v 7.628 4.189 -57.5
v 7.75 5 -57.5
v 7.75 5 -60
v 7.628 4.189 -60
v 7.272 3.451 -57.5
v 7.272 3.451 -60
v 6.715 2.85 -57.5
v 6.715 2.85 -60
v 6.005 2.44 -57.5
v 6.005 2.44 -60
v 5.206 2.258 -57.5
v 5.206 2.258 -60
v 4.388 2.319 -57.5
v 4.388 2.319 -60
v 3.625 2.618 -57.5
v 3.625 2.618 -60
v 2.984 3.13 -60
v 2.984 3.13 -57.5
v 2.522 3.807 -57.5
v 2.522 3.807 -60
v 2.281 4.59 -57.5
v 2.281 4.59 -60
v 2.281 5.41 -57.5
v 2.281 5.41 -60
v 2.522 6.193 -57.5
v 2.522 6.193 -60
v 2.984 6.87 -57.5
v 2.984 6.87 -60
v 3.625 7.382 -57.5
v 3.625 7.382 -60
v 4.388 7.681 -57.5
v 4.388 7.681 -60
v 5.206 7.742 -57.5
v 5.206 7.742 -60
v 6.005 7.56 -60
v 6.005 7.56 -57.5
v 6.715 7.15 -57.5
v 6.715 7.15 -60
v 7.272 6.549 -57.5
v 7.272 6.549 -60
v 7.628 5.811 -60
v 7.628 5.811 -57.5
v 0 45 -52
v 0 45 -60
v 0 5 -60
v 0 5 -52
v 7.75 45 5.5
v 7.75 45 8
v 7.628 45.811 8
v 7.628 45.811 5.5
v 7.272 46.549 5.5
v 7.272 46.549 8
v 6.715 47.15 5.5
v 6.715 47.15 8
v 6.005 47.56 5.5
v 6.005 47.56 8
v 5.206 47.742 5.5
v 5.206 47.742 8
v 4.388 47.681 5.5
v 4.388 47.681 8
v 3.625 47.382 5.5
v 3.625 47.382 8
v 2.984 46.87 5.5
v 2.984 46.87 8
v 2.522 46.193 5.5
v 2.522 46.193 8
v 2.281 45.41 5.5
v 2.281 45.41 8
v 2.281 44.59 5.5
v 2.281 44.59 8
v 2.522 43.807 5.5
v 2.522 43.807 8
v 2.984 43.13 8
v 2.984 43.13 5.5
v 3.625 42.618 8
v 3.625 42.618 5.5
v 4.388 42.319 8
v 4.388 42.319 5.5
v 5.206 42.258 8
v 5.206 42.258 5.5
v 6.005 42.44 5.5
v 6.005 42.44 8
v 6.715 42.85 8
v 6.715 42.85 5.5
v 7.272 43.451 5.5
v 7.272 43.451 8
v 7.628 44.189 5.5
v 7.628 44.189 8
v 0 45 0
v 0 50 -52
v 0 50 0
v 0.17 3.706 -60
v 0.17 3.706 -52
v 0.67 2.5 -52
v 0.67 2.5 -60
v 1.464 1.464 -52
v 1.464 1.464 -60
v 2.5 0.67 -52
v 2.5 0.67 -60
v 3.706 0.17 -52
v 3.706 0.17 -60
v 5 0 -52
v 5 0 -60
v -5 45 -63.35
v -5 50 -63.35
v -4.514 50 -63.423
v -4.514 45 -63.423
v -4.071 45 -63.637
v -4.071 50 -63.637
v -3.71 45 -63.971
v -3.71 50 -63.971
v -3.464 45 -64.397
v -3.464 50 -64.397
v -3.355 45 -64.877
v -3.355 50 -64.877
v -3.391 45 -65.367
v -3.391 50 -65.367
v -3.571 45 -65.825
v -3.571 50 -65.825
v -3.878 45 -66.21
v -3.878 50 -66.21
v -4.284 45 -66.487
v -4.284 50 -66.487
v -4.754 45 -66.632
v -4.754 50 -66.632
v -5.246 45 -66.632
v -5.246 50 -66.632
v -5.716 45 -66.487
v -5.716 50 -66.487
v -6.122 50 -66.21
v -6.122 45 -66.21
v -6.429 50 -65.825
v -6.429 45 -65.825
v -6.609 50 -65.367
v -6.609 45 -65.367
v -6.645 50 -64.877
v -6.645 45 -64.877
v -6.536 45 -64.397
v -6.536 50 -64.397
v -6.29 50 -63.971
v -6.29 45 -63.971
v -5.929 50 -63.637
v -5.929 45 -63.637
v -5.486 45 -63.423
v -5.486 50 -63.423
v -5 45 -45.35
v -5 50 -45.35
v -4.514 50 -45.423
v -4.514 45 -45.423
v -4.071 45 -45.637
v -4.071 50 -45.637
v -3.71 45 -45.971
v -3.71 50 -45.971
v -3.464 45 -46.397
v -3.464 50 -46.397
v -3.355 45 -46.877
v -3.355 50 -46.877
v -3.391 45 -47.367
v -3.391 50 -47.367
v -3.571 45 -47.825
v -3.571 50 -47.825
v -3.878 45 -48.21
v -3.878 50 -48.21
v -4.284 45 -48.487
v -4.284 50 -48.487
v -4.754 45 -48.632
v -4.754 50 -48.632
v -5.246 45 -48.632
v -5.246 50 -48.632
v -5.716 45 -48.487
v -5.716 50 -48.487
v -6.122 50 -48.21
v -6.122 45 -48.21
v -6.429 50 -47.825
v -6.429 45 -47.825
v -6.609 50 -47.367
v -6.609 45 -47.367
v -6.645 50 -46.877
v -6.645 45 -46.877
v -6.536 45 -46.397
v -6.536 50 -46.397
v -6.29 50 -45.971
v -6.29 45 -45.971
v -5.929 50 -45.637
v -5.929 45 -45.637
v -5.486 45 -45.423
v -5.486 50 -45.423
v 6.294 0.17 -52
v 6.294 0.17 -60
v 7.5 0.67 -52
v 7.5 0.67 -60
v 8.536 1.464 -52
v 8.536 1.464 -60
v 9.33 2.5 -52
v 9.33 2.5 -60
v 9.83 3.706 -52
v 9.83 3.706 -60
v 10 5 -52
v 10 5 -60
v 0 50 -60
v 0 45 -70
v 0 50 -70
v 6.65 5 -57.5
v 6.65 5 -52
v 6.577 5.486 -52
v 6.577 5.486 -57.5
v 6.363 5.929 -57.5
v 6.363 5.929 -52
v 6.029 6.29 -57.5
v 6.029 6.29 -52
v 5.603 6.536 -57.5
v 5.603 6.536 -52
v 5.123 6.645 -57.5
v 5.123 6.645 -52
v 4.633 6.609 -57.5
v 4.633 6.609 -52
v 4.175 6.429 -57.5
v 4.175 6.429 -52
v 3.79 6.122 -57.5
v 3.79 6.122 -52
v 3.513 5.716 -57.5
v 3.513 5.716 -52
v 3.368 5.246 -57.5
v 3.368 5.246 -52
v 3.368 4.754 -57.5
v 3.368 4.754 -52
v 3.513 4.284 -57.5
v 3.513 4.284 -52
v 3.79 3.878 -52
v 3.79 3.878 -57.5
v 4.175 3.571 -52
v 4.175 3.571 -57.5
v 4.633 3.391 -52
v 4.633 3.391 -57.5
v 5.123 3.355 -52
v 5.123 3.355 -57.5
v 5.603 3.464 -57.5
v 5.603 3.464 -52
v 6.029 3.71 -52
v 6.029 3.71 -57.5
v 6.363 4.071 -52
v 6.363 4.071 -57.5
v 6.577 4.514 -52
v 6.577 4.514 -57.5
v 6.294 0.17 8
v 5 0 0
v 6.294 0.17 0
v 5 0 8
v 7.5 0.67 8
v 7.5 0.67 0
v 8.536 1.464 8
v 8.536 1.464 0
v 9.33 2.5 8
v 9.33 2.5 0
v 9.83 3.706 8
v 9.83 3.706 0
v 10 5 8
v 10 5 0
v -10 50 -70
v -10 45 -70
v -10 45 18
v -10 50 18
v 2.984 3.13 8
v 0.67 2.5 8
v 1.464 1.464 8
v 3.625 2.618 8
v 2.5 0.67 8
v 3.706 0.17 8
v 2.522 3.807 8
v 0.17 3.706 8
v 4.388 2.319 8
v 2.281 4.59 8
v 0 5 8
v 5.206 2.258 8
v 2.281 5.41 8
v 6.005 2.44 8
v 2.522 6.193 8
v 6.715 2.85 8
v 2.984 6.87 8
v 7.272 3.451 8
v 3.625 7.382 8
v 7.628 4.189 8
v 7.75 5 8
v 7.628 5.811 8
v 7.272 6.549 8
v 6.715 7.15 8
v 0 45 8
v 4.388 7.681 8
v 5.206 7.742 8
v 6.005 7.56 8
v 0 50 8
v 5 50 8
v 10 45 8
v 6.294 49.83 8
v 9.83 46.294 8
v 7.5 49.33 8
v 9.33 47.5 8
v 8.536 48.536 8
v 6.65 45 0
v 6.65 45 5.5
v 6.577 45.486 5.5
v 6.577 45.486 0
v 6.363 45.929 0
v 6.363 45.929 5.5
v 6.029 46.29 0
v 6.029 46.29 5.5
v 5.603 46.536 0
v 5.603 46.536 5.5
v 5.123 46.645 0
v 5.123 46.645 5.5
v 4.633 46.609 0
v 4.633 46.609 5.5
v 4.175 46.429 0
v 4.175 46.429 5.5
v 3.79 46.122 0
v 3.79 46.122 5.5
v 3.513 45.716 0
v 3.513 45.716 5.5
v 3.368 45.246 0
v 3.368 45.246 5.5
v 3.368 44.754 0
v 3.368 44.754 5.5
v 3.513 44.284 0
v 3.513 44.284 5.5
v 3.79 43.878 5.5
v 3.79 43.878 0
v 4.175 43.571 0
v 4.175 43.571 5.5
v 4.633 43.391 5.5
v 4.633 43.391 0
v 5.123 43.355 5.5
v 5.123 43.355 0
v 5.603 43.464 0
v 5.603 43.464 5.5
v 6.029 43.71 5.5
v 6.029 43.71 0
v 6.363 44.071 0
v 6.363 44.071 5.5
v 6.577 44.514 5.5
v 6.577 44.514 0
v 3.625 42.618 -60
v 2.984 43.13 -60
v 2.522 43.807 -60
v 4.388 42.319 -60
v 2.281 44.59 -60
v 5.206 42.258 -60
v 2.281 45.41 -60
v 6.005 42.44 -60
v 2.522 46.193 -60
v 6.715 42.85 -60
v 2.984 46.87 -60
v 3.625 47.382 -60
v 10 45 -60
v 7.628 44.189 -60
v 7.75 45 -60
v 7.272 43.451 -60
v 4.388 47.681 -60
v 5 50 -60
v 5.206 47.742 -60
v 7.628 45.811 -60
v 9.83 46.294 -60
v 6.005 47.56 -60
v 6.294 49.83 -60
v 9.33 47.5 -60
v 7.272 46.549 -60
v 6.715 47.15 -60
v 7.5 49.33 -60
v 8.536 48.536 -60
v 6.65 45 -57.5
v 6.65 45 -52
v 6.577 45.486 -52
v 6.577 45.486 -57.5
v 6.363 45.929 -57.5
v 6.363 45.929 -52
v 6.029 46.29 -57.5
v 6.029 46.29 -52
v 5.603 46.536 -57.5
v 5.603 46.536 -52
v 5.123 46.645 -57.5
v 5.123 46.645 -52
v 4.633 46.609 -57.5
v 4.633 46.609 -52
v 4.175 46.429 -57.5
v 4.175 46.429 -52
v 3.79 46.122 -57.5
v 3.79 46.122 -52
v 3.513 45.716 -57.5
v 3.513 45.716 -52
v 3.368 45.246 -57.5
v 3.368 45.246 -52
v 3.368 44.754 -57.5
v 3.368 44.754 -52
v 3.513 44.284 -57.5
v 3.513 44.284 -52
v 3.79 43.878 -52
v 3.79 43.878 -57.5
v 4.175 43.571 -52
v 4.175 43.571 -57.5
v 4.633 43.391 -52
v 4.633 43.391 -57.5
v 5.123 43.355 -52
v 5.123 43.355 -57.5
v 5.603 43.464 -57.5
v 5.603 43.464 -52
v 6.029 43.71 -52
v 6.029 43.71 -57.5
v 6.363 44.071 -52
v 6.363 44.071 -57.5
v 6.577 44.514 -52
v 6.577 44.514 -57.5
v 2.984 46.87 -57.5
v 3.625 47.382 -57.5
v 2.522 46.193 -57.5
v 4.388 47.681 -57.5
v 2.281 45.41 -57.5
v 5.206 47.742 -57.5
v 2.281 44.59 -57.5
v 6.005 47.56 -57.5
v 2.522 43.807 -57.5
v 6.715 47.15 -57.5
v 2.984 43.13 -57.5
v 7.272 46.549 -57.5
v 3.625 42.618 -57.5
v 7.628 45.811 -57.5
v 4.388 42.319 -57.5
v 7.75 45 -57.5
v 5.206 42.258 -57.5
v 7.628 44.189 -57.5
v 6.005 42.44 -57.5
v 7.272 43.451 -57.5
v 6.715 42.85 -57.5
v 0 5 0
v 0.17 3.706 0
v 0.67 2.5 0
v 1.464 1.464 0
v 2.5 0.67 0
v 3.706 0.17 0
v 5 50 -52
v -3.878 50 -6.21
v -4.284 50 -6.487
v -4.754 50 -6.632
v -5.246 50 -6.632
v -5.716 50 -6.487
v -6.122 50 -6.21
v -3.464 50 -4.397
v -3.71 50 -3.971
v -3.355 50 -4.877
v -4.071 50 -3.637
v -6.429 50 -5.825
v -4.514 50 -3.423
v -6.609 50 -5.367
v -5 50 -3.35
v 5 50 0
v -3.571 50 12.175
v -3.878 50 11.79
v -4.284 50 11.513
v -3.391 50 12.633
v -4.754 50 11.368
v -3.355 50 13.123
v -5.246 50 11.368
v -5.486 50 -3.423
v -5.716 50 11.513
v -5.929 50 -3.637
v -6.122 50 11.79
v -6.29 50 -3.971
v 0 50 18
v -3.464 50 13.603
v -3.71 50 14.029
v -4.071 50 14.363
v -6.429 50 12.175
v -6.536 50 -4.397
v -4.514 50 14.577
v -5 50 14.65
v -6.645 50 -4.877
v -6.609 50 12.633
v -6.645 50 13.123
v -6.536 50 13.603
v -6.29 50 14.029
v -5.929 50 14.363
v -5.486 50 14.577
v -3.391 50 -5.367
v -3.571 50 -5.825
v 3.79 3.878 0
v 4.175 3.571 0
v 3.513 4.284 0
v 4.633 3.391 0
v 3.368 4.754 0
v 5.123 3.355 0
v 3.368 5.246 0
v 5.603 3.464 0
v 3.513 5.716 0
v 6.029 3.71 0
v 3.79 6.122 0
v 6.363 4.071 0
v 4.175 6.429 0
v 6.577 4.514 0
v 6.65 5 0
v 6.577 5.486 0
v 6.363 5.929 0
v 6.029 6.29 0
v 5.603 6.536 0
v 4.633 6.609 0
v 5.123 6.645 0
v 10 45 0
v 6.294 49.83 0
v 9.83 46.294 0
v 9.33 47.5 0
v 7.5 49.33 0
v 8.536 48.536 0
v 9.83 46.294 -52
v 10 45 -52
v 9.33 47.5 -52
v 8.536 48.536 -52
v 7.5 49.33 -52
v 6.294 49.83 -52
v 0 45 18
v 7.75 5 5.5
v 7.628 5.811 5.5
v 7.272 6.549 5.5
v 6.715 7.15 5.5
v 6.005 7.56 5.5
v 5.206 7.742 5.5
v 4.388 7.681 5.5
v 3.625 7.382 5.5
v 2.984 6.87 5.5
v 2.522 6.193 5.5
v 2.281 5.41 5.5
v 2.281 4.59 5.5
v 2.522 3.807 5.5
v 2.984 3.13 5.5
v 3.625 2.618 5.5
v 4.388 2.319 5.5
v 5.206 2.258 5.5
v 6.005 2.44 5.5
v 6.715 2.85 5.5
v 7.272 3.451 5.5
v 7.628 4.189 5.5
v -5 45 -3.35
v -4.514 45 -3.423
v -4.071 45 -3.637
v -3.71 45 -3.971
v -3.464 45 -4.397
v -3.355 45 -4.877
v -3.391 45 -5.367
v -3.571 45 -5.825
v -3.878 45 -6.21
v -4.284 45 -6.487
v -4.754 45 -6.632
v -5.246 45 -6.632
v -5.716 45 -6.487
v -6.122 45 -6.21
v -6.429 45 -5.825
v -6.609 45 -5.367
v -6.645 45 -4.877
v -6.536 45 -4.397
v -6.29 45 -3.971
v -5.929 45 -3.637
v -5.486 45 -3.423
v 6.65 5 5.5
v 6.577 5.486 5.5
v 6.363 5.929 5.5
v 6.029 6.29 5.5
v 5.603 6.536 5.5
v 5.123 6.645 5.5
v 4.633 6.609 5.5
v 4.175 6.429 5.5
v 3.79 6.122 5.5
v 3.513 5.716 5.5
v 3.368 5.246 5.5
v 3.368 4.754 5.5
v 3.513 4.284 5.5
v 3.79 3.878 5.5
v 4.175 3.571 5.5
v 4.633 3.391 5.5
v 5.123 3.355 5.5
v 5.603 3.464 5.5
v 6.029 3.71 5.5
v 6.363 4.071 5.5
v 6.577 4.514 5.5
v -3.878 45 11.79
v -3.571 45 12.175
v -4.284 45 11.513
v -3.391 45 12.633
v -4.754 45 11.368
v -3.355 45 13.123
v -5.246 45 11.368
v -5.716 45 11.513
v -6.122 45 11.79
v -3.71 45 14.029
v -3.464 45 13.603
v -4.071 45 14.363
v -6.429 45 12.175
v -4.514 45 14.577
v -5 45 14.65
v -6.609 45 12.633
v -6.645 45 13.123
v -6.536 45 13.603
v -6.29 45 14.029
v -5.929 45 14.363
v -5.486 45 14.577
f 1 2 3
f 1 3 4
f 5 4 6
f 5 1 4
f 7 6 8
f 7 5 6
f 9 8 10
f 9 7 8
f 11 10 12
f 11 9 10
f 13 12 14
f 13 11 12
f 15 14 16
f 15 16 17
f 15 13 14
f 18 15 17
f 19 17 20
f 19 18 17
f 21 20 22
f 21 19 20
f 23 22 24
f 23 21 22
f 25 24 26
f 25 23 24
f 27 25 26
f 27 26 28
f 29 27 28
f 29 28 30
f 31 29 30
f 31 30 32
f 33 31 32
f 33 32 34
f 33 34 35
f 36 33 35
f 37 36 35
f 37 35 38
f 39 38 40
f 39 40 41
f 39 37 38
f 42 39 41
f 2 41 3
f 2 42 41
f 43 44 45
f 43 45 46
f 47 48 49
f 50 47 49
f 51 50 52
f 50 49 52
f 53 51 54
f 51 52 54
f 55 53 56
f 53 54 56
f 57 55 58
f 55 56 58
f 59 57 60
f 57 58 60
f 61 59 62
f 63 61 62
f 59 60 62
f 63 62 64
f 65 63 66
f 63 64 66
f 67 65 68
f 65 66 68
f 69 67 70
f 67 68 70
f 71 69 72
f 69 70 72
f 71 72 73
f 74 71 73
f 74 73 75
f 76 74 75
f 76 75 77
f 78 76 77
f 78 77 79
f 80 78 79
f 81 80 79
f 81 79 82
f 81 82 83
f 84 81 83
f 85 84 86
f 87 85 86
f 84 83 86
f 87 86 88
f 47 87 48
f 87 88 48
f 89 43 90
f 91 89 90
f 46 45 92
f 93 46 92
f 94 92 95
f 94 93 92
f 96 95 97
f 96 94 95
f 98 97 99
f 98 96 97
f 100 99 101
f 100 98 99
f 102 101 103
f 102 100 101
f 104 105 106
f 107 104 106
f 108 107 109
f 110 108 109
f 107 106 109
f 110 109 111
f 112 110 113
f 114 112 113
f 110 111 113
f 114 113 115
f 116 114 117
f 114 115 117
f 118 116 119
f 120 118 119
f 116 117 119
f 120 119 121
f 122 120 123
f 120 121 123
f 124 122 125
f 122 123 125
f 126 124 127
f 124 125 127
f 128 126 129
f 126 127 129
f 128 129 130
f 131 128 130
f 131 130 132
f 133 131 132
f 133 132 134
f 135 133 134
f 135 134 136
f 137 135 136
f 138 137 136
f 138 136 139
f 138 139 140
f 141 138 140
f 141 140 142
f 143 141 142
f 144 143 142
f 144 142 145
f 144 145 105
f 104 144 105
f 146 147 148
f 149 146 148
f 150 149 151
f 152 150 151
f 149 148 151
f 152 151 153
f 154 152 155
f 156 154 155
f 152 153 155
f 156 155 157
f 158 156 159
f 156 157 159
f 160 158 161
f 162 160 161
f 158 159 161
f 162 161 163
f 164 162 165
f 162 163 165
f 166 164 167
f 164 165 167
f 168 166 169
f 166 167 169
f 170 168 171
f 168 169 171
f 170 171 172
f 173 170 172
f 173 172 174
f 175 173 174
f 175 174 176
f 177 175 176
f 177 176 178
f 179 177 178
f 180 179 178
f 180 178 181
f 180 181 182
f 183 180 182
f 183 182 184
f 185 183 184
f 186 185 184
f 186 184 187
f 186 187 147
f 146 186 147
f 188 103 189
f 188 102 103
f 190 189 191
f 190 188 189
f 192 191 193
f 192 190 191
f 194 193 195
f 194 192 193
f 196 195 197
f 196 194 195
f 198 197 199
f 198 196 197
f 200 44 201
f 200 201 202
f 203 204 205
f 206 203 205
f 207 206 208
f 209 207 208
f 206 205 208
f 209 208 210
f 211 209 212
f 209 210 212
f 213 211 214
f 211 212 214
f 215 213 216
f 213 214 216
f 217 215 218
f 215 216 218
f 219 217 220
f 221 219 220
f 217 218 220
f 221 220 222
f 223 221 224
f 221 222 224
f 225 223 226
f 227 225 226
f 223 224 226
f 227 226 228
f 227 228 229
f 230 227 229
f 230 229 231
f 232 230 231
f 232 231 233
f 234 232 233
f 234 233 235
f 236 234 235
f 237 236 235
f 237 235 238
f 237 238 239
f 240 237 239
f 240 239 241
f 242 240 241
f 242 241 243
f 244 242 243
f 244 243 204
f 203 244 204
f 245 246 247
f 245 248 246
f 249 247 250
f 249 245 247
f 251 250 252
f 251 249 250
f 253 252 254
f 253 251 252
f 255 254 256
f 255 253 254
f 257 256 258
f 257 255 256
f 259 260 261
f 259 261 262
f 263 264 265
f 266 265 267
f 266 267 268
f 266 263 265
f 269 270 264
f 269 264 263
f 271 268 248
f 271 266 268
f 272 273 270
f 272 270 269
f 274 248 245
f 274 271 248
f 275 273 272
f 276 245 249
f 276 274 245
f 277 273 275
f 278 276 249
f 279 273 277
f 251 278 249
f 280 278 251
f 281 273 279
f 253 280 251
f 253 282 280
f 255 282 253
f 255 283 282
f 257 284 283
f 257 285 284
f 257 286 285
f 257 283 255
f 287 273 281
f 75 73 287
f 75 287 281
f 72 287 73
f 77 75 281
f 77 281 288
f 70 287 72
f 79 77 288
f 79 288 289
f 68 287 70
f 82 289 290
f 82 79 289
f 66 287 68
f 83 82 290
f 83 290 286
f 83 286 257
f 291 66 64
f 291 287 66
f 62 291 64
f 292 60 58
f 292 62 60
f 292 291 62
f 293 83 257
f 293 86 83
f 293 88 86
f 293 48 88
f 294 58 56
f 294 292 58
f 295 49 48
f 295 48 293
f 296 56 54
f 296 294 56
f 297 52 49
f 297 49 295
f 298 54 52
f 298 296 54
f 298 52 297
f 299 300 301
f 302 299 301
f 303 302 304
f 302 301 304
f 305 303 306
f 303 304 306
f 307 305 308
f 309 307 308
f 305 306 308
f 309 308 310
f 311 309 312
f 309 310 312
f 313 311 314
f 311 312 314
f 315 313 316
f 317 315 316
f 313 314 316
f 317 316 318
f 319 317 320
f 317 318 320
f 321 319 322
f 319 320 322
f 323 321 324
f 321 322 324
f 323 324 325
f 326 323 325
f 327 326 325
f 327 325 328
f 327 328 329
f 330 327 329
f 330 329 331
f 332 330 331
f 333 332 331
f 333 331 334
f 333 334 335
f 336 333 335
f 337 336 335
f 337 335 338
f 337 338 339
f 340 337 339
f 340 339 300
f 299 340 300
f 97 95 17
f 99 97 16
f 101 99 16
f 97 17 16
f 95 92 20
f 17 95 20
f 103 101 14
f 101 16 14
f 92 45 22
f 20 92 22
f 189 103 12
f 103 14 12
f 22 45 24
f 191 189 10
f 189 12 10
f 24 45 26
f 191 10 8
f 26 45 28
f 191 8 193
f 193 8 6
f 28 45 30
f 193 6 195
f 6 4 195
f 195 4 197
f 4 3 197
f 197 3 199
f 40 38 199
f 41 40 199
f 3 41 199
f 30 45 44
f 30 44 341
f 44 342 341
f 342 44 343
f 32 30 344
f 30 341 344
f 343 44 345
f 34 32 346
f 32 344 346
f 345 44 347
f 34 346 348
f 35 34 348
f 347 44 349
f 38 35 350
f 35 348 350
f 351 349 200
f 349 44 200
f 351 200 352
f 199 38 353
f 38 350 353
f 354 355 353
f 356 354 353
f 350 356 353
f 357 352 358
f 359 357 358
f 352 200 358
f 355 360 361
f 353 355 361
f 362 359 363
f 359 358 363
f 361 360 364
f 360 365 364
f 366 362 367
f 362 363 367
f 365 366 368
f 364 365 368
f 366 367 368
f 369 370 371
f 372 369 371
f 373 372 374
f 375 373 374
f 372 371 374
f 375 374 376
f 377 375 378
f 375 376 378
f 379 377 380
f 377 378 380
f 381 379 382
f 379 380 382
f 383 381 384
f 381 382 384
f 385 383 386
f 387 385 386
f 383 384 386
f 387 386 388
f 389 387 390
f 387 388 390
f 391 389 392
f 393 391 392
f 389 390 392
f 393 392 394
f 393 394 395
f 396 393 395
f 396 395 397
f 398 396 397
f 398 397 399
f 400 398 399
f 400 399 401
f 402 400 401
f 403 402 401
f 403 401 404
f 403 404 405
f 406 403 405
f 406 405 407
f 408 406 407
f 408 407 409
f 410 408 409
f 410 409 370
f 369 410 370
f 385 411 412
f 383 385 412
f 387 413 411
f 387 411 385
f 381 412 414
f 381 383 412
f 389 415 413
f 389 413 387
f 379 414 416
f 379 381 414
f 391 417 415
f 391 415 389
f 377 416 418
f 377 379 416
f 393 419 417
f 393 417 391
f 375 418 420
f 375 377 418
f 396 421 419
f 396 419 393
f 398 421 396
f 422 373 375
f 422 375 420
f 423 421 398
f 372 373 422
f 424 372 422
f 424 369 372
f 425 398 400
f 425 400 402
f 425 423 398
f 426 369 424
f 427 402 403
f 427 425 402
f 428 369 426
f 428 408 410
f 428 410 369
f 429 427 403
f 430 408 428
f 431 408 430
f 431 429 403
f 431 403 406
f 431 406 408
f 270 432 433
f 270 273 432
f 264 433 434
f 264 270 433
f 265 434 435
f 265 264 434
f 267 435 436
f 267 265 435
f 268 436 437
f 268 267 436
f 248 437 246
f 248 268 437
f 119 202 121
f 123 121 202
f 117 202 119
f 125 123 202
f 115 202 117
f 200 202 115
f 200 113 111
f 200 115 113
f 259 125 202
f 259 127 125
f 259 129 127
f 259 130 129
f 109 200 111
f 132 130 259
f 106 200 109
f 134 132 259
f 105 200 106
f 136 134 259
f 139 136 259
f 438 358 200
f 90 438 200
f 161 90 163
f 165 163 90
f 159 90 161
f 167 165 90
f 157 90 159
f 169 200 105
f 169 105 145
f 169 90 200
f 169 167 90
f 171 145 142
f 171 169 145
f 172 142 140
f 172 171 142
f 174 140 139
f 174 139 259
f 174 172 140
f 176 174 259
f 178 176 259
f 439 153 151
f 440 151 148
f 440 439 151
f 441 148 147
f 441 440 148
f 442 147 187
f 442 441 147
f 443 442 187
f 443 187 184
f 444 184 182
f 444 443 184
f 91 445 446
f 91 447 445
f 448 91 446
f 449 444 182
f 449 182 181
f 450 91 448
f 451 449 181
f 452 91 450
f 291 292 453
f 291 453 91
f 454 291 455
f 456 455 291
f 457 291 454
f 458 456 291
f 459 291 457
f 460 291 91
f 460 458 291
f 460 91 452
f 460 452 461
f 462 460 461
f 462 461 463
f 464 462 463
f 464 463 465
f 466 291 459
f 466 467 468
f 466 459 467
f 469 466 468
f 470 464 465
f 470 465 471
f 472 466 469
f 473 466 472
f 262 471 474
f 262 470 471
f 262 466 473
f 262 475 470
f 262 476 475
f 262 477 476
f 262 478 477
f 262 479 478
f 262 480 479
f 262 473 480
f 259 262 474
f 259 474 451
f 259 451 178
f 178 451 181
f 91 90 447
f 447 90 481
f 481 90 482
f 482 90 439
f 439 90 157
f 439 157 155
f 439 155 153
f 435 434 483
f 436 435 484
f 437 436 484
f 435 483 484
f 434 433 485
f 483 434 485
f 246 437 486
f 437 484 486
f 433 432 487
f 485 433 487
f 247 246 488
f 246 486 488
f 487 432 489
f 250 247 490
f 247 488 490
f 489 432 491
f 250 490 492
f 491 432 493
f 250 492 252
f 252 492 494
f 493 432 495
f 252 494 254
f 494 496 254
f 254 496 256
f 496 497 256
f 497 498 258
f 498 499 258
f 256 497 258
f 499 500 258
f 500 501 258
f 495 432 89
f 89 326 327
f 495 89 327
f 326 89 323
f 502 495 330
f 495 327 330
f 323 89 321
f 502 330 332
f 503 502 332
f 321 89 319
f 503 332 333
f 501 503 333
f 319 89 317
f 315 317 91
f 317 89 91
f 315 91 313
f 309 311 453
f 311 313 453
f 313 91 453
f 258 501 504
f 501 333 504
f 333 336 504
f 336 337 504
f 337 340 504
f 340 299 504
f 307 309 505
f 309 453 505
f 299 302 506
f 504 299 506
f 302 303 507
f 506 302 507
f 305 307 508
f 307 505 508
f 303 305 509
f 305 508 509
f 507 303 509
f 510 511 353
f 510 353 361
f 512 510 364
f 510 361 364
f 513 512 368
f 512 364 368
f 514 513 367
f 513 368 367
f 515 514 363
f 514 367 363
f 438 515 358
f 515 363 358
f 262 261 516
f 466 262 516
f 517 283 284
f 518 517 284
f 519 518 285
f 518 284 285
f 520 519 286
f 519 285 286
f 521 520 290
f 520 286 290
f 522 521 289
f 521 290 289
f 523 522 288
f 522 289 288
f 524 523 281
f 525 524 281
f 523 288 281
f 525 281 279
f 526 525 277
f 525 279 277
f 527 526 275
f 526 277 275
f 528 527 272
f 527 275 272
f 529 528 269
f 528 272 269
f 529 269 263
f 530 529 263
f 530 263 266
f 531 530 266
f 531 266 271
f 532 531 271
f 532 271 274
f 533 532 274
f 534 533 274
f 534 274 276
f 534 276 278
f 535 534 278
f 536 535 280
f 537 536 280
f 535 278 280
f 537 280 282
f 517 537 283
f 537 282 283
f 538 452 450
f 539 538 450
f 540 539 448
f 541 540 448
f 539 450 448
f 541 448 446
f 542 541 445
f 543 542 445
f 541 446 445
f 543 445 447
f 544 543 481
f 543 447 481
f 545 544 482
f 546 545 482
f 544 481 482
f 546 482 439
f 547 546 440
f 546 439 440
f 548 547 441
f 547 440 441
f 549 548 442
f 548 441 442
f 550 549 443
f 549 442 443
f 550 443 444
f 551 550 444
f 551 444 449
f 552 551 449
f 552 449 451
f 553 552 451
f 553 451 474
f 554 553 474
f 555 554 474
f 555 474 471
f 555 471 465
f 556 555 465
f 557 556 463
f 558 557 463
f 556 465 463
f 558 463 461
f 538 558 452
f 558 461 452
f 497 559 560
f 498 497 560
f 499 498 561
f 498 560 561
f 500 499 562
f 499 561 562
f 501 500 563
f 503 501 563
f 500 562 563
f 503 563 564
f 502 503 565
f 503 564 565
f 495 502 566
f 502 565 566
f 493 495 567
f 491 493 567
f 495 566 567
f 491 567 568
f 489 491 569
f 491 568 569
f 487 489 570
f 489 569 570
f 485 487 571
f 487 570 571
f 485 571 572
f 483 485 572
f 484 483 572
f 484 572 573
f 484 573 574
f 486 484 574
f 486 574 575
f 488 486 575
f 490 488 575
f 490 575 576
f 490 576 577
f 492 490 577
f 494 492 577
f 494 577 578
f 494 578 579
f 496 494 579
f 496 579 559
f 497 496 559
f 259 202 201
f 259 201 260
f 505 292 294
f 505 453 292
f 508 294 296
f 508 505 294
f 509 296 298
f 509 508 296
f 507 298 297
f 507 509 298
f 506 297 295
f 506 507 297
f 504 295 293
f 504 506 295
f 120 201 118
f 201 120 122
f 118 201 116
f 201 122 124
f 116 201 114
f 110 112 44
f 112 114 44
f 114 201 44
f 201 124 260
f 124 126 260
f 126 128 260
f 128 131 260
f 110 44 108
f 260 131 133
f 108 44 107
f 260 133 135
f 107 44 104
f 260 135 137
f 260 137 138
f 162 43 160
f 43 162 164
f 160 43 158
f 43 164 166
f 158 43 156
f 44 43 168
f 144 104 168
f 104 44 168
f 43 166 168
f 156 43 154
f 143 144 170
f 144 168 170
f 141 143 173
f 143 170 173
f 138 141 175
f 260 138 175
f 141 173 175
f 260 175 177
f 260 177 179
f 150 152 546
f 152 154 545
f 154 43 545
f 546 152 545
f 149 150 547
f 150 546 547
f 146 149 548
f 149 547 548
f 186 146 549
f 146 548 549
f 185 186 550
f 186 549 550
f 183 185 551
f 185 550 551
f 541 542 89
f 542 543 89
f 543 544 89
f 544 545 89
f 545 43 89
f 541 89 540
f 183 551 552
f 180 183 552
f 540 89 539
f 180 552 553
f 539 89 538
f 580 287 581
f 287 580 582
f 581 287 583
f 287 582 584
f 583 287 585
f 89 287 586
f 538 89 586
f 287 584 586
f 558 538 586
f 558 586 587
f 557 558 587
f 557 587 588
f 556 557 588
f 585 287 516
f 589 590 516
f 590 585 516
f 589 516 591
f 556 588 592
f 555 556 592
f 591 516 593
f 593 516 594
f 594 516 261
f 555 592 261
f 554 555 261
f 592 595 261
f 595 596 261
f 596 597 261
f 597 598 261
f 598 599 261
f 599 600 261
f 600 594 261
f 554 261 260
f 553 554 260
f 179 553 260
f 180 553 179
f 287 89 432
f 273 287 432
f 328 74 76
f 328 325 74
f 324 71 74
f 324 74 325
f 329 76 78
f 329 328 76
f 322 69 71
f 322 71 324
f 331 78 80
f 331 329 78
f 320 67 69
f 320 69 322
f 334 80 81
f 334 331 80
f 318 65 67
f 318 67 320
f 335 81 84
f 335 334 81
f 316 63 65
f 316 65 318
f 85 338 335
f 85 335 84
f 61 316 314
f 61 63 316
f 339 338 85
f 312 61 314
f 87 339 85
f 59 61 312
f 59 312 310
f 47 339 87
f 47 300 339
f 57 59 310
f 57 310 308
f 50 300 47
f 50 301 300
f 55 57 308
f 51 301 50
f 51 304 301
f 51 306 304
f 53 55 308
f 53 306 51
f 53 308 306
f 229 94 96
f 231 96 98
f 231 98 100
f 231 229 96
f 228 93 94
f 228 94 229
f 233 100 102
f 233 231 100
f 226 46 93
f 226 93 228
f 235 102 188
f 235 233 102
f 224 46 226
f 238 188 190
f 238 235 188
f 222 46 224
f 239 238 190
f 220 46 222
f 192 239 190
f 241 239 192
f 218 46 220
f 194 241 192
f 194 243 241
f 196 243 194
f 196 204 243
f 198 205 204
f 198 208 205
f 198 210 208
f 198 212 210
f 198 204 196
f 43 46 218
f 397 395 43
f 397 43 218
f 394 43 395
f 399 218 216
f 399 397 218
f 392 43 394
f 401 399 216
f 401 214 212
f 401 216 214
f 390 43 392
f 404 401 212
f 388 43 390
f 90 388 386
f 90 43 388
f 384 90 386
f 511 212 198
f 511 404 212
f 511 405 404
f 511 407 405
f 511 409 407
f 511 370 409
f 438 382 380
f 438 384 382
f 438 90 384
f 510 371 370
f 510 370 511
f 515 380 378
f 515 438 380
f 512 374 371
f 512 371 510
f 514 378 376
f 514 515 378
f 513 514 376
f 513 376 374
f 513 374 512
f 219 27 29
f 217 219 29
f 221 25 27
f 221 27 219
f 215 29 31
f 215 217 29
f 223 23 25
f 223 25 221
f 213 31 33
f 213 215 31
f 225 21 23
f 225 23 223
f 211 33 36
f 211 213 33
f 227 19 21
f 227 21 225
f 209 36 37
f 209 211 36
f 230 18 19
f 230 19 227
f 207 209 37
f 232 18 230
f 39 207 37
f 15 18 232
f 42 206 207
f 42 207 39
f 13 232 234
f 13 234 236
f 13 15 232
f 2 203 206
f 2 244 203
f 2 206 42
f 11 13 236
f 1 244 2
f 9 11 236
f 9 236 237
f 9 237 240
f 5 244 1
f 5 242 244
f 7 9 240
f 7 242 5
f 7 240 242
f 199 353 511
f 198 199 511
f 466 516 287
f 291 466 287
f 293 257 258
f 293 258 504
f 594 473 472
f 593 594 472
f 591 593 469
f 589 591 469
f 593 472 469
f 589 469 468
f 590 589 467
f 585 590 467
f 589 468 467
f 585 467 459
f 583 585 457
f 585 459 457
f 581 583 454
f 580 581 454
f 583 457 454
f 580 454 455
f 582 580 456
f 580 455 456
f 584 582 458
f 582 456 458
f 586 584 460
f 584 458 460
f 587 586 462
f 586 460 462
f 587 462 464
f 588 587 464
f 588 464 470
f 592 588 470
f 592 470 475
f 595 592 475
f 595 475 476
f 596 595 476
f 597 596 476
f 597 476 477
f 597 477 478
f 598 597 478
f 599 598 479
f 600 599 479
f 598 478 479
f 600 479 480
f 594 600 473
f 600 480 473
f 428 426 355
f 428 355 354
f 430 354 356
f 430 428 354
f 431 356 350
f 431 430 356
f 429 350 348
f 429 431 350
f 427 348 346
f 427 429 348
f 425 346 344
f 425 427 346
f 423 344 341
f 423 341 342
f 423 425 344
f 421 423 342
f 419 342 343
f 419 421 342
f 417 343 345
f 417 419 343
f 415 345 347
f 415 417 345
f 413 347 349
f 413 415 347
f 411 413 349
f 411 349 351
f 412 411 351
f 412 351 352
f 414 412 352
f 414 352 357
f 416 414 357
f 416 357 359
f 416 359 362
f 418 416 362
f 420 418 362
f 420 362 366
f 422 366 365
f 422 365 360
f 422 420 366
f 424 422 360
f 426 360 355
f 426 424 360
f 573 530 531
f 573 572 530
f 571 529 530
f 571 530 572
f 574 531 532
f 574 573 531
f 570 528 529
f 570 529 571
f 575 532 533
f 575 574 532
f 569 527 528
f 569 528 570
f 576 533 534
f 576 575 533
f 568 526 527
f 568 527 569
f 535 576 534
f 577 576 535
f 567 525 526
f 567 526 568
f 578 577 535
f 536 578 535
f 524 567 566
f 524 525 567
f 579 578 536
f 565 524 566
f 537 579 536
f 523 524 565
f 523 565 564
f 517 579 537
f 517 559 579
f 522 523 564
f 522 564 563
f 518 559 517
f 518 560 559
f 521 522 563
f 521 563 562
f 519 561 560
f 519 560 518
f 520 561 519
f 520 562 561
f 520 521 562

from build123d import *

# Parameters (mm, degrees)
P_IDAT_VYSUNUT_M1_DEPTH  = 8
SKICA2_R                 = 1.65
ODEBRAT_VYSUNUT_M1_DEPTH = 47.786750261
P_IDAT_VYSUNUT_M2_DEPTH  = 5
SKICA4_R                 = 1.65
ODEBRAT_VYSUNUT_M2_DEPTH = 5
SKICA5_R                 = 1.65
ODEBRAT_VYSUNUT_M3_DEPTH = 55.074023338
ZAOBLIT1_R               = 5
SKICA6_W                 = 2
SKICA6_H                 = 23
P_IDAT_VYSUNUT_M3_DEPTH  = 8
SKICA7_R                 = 2.75
ODEBRAT_VYSUNUT_M4_DEPTH = 2.5
SKICA8_W                 = 10
SKICA8_H                 = 5
P_IDAT_VYSUNUT_M4_DEPTH  = 60
SKICA9_W                 = 8
SKICA9_H                 = 5
P_IDAT_VYSUNUT_M5_DEPTH  = 10
SKICA10_W                = 10
SKICA10_H                = 8
P_IDAT_VYSUNUT_M6_DEPTH  = 45
ZAOBLIT2_R               = 5
SKICA11_R                = 1.65
ODEBRAT_VYSUNUT_M5_DEPTH = 45
ODEBRAT_START            = -2.5
SKICA12_R                = 2.75
ODEBRAT_VYSUNUT_M6_DEPTH = 2.5
SKICA13_R                = 1.65
ODEBRAT_VYSUNUT_M7_DEPTH = 12.5


with BuildPart() as part:
    # Skica1 → Přidat vysunutím1 (new body)
    with BuildSketch(Plane.XY):
        Polygon((0, 0), (10, 0), (10, 10), (8, 10), (8, 33), (10, 33), (10, 45), (0, 45), align=None)
    extrude(amount=P_IDAT_VYSUNUT_M1_DEPTH)

    # Skica2 → Odebrat vysunutím1 (cut, through all)
    with BuildSketch(Plane.XY.offset(8)):
        with Locations((5, 45)):
            Circle(SKICA2_R)
        with Locations((5, 5)):
            Circle(SKICA2_R)
    extrude(amount=-ODEBRAT_VYSUNUT_M1_DEPTH, mode=Mode.SUBTRACT)

    # Skica3 → Přidat vysunutím2 (add)
    with BuildSketch(Plane(origin=(0, 45, 0), x_dir=(1, 0, 0), z_dir=(0, 1, 0))):
        Polygon((0, 0), (0, 10), (-10, 10), (-10, -18), (0, -18), (0, -8), (10, -8), (10, 0), align=None)
    extrude(amount=P_IDAT_VYSUNUT_M2_DEPTH)

    # Skica4 → Odebrat vysunutím2 (cut)
    with BuildSketch(Plane(origin=(0, 50, 0), x_dir=(1, 0, 0), z_dir=(0, 1, 0))):
        with Locations(Location((-5, 5, 0), (0, 0, 270))):
            Circle(SKICA4_R)
        with Locations(Location((-5, -13, 0), (0, 0, 270))):
            Circle(SKICA4_R)
    extrude(amount=-ODEBRAT_VYSUNUT_M2_DEPTH, mode=Mode.SUBTRACT)

    # Skica5 → Odebrat vysunutím3 (cut, through all)
    with BuildSketch(Plane.XY.offset(8)):
        with Locations((5, 45)):
            Circle(SKICA5_R)
    extrude(amount=-ODEBRAT_VYSUNUT_M3_DEPTH, mode=Mode.SUBTRACT)

    # Zaoblit1
    zaoblit1_edges = [part.edges().sort_by_distance(p)[0] for p in [
        (0, 0, 4),
        (10, 0, 4),
        (10, 50, 4),
    ]]
    fillet(zaoblit1_edges, radius=ZAOBLIT1_R - 0.0001)  # a hair under: the kernel refuses the full size

    # Skica6 → Přidat vysunutím3 (add)
    with BuildSketch(Plane.XY.offset(8)):
        with Locations((9, 21.5)):
            Rectangle(SKICA6_W, SKICA6_H)
    extrude(amount=-P_IDAT_VYSUNUT_M3_DEPTH)

    # Skica7 → Odebrat vysunutím4 (cut)
    with BuildSketch(Plane.XY.offset(8)):
        with Locations((5, 5)):
            Circle(SKICA7_R)
        with Locations((5, 45)):
            Circle(SKICA7_R)
    extrude(amount=-ODEBRAT_VYSUNUT_M4_DEPTH, mode=Mode.SUBTRACT)

    # Skica8 → Přidat vysunutím4 (add)
    with BuildSketch(Plane(origin=(0, 0, -10), x_dir=(-1, 0, 0), z_dir=(0, 0, -1))):
        with Locations((5, 47.5)):
            Rectangle(SKICA8_W, SKICA8_H)
    extrude(amount=P_IDAT_VYSUNUT_M4_DEPTH)

    # Skica9 → Přidat vysunutím5 (add)
    with BuildSketch(Plane(origin=(0, 0, 0), x_dir=(0, 0, -1), z_dir=(1, 0, 0))):
        with Locations((56, 47.5)):
            Rectangle(SKICA9_W, SKICA9_H)
    extrude(amount=P_IDAT_VYSUNUT_M5_DEPTH)

    # Skica10 → Přidat vysunutím6 (add)
    with BuildSketch(Plane.XZ.offset(-45)):
        with Locations((5, -56)):
            Rectangle(SKICA10_W, SKICA10_H)
    extrude(amount=P_IDAT_VYSUNUT_M6_DEPTH)

    # Zaoblit2
    zaoblit2_edges = [part.edges().sort_by_distance(p)[0] for p in [
        (10, 50, -56),
        (10, 0, -56),
        (0, 0, -56),
    ]]
    fillet(zaoblit2_edges, radius=ZAOBLIT2_R - 0.0001)  # a hair under: the kernel refuses the full size

    # Skica11 → Odebrat vysunutím5 (cut)
    with BuildSketch(Plane.XY.offset(-52)):
        with Locations((5, 45)):
            Circle(SKICA11_R)
        with Locations((5, 5)):
            Circle(SKICA11_R)
    extrude(amount=-ODEBRAT_VYSUNUT_M5_DEPTH, mode=Mode.SUBTRACT)

    # Skica12 → Odebrat vysunutím6 (cut)
    with BuildSketch(Plane(origin=(0, 0, -60), x_dir=(-1, 0, 0), z_dir=(0, 0, -1)).offset(ODEBRAT_START)):
        with Locations(Location((-5, 45, 0), (0, 0, 180))):
            Circle(SKICA12_R)
        with Locations(Location((-5, 5, 0), (0, 0, 180))):
            Circle(SKICA12_R)
    extrude(amount=ODEBRAT_VYSUNUT_M6_DEPTH, mode=Mode.SUBTRACT)

    # Skica13 → Odebrat vysunutím7 (cut)
    with BuildSketch(Plane(origin=(0, 50, 0), x_dir=(1, 0, 0), z_dir=(0, 1, 0))):
        with Locations(Location((-5, 65, 0), (0, 0, 270))):
            Circle(SKICA13_R)
        with Locations(Location((-5, 47, 0), (0, 0, 270))):
            Circle(SKICA13_R)
    extrude(amount=-ODEBRAT_VYSUNUT_M7_DEPTH, mode=Mode.SUBTRACT)


solid = part.part
